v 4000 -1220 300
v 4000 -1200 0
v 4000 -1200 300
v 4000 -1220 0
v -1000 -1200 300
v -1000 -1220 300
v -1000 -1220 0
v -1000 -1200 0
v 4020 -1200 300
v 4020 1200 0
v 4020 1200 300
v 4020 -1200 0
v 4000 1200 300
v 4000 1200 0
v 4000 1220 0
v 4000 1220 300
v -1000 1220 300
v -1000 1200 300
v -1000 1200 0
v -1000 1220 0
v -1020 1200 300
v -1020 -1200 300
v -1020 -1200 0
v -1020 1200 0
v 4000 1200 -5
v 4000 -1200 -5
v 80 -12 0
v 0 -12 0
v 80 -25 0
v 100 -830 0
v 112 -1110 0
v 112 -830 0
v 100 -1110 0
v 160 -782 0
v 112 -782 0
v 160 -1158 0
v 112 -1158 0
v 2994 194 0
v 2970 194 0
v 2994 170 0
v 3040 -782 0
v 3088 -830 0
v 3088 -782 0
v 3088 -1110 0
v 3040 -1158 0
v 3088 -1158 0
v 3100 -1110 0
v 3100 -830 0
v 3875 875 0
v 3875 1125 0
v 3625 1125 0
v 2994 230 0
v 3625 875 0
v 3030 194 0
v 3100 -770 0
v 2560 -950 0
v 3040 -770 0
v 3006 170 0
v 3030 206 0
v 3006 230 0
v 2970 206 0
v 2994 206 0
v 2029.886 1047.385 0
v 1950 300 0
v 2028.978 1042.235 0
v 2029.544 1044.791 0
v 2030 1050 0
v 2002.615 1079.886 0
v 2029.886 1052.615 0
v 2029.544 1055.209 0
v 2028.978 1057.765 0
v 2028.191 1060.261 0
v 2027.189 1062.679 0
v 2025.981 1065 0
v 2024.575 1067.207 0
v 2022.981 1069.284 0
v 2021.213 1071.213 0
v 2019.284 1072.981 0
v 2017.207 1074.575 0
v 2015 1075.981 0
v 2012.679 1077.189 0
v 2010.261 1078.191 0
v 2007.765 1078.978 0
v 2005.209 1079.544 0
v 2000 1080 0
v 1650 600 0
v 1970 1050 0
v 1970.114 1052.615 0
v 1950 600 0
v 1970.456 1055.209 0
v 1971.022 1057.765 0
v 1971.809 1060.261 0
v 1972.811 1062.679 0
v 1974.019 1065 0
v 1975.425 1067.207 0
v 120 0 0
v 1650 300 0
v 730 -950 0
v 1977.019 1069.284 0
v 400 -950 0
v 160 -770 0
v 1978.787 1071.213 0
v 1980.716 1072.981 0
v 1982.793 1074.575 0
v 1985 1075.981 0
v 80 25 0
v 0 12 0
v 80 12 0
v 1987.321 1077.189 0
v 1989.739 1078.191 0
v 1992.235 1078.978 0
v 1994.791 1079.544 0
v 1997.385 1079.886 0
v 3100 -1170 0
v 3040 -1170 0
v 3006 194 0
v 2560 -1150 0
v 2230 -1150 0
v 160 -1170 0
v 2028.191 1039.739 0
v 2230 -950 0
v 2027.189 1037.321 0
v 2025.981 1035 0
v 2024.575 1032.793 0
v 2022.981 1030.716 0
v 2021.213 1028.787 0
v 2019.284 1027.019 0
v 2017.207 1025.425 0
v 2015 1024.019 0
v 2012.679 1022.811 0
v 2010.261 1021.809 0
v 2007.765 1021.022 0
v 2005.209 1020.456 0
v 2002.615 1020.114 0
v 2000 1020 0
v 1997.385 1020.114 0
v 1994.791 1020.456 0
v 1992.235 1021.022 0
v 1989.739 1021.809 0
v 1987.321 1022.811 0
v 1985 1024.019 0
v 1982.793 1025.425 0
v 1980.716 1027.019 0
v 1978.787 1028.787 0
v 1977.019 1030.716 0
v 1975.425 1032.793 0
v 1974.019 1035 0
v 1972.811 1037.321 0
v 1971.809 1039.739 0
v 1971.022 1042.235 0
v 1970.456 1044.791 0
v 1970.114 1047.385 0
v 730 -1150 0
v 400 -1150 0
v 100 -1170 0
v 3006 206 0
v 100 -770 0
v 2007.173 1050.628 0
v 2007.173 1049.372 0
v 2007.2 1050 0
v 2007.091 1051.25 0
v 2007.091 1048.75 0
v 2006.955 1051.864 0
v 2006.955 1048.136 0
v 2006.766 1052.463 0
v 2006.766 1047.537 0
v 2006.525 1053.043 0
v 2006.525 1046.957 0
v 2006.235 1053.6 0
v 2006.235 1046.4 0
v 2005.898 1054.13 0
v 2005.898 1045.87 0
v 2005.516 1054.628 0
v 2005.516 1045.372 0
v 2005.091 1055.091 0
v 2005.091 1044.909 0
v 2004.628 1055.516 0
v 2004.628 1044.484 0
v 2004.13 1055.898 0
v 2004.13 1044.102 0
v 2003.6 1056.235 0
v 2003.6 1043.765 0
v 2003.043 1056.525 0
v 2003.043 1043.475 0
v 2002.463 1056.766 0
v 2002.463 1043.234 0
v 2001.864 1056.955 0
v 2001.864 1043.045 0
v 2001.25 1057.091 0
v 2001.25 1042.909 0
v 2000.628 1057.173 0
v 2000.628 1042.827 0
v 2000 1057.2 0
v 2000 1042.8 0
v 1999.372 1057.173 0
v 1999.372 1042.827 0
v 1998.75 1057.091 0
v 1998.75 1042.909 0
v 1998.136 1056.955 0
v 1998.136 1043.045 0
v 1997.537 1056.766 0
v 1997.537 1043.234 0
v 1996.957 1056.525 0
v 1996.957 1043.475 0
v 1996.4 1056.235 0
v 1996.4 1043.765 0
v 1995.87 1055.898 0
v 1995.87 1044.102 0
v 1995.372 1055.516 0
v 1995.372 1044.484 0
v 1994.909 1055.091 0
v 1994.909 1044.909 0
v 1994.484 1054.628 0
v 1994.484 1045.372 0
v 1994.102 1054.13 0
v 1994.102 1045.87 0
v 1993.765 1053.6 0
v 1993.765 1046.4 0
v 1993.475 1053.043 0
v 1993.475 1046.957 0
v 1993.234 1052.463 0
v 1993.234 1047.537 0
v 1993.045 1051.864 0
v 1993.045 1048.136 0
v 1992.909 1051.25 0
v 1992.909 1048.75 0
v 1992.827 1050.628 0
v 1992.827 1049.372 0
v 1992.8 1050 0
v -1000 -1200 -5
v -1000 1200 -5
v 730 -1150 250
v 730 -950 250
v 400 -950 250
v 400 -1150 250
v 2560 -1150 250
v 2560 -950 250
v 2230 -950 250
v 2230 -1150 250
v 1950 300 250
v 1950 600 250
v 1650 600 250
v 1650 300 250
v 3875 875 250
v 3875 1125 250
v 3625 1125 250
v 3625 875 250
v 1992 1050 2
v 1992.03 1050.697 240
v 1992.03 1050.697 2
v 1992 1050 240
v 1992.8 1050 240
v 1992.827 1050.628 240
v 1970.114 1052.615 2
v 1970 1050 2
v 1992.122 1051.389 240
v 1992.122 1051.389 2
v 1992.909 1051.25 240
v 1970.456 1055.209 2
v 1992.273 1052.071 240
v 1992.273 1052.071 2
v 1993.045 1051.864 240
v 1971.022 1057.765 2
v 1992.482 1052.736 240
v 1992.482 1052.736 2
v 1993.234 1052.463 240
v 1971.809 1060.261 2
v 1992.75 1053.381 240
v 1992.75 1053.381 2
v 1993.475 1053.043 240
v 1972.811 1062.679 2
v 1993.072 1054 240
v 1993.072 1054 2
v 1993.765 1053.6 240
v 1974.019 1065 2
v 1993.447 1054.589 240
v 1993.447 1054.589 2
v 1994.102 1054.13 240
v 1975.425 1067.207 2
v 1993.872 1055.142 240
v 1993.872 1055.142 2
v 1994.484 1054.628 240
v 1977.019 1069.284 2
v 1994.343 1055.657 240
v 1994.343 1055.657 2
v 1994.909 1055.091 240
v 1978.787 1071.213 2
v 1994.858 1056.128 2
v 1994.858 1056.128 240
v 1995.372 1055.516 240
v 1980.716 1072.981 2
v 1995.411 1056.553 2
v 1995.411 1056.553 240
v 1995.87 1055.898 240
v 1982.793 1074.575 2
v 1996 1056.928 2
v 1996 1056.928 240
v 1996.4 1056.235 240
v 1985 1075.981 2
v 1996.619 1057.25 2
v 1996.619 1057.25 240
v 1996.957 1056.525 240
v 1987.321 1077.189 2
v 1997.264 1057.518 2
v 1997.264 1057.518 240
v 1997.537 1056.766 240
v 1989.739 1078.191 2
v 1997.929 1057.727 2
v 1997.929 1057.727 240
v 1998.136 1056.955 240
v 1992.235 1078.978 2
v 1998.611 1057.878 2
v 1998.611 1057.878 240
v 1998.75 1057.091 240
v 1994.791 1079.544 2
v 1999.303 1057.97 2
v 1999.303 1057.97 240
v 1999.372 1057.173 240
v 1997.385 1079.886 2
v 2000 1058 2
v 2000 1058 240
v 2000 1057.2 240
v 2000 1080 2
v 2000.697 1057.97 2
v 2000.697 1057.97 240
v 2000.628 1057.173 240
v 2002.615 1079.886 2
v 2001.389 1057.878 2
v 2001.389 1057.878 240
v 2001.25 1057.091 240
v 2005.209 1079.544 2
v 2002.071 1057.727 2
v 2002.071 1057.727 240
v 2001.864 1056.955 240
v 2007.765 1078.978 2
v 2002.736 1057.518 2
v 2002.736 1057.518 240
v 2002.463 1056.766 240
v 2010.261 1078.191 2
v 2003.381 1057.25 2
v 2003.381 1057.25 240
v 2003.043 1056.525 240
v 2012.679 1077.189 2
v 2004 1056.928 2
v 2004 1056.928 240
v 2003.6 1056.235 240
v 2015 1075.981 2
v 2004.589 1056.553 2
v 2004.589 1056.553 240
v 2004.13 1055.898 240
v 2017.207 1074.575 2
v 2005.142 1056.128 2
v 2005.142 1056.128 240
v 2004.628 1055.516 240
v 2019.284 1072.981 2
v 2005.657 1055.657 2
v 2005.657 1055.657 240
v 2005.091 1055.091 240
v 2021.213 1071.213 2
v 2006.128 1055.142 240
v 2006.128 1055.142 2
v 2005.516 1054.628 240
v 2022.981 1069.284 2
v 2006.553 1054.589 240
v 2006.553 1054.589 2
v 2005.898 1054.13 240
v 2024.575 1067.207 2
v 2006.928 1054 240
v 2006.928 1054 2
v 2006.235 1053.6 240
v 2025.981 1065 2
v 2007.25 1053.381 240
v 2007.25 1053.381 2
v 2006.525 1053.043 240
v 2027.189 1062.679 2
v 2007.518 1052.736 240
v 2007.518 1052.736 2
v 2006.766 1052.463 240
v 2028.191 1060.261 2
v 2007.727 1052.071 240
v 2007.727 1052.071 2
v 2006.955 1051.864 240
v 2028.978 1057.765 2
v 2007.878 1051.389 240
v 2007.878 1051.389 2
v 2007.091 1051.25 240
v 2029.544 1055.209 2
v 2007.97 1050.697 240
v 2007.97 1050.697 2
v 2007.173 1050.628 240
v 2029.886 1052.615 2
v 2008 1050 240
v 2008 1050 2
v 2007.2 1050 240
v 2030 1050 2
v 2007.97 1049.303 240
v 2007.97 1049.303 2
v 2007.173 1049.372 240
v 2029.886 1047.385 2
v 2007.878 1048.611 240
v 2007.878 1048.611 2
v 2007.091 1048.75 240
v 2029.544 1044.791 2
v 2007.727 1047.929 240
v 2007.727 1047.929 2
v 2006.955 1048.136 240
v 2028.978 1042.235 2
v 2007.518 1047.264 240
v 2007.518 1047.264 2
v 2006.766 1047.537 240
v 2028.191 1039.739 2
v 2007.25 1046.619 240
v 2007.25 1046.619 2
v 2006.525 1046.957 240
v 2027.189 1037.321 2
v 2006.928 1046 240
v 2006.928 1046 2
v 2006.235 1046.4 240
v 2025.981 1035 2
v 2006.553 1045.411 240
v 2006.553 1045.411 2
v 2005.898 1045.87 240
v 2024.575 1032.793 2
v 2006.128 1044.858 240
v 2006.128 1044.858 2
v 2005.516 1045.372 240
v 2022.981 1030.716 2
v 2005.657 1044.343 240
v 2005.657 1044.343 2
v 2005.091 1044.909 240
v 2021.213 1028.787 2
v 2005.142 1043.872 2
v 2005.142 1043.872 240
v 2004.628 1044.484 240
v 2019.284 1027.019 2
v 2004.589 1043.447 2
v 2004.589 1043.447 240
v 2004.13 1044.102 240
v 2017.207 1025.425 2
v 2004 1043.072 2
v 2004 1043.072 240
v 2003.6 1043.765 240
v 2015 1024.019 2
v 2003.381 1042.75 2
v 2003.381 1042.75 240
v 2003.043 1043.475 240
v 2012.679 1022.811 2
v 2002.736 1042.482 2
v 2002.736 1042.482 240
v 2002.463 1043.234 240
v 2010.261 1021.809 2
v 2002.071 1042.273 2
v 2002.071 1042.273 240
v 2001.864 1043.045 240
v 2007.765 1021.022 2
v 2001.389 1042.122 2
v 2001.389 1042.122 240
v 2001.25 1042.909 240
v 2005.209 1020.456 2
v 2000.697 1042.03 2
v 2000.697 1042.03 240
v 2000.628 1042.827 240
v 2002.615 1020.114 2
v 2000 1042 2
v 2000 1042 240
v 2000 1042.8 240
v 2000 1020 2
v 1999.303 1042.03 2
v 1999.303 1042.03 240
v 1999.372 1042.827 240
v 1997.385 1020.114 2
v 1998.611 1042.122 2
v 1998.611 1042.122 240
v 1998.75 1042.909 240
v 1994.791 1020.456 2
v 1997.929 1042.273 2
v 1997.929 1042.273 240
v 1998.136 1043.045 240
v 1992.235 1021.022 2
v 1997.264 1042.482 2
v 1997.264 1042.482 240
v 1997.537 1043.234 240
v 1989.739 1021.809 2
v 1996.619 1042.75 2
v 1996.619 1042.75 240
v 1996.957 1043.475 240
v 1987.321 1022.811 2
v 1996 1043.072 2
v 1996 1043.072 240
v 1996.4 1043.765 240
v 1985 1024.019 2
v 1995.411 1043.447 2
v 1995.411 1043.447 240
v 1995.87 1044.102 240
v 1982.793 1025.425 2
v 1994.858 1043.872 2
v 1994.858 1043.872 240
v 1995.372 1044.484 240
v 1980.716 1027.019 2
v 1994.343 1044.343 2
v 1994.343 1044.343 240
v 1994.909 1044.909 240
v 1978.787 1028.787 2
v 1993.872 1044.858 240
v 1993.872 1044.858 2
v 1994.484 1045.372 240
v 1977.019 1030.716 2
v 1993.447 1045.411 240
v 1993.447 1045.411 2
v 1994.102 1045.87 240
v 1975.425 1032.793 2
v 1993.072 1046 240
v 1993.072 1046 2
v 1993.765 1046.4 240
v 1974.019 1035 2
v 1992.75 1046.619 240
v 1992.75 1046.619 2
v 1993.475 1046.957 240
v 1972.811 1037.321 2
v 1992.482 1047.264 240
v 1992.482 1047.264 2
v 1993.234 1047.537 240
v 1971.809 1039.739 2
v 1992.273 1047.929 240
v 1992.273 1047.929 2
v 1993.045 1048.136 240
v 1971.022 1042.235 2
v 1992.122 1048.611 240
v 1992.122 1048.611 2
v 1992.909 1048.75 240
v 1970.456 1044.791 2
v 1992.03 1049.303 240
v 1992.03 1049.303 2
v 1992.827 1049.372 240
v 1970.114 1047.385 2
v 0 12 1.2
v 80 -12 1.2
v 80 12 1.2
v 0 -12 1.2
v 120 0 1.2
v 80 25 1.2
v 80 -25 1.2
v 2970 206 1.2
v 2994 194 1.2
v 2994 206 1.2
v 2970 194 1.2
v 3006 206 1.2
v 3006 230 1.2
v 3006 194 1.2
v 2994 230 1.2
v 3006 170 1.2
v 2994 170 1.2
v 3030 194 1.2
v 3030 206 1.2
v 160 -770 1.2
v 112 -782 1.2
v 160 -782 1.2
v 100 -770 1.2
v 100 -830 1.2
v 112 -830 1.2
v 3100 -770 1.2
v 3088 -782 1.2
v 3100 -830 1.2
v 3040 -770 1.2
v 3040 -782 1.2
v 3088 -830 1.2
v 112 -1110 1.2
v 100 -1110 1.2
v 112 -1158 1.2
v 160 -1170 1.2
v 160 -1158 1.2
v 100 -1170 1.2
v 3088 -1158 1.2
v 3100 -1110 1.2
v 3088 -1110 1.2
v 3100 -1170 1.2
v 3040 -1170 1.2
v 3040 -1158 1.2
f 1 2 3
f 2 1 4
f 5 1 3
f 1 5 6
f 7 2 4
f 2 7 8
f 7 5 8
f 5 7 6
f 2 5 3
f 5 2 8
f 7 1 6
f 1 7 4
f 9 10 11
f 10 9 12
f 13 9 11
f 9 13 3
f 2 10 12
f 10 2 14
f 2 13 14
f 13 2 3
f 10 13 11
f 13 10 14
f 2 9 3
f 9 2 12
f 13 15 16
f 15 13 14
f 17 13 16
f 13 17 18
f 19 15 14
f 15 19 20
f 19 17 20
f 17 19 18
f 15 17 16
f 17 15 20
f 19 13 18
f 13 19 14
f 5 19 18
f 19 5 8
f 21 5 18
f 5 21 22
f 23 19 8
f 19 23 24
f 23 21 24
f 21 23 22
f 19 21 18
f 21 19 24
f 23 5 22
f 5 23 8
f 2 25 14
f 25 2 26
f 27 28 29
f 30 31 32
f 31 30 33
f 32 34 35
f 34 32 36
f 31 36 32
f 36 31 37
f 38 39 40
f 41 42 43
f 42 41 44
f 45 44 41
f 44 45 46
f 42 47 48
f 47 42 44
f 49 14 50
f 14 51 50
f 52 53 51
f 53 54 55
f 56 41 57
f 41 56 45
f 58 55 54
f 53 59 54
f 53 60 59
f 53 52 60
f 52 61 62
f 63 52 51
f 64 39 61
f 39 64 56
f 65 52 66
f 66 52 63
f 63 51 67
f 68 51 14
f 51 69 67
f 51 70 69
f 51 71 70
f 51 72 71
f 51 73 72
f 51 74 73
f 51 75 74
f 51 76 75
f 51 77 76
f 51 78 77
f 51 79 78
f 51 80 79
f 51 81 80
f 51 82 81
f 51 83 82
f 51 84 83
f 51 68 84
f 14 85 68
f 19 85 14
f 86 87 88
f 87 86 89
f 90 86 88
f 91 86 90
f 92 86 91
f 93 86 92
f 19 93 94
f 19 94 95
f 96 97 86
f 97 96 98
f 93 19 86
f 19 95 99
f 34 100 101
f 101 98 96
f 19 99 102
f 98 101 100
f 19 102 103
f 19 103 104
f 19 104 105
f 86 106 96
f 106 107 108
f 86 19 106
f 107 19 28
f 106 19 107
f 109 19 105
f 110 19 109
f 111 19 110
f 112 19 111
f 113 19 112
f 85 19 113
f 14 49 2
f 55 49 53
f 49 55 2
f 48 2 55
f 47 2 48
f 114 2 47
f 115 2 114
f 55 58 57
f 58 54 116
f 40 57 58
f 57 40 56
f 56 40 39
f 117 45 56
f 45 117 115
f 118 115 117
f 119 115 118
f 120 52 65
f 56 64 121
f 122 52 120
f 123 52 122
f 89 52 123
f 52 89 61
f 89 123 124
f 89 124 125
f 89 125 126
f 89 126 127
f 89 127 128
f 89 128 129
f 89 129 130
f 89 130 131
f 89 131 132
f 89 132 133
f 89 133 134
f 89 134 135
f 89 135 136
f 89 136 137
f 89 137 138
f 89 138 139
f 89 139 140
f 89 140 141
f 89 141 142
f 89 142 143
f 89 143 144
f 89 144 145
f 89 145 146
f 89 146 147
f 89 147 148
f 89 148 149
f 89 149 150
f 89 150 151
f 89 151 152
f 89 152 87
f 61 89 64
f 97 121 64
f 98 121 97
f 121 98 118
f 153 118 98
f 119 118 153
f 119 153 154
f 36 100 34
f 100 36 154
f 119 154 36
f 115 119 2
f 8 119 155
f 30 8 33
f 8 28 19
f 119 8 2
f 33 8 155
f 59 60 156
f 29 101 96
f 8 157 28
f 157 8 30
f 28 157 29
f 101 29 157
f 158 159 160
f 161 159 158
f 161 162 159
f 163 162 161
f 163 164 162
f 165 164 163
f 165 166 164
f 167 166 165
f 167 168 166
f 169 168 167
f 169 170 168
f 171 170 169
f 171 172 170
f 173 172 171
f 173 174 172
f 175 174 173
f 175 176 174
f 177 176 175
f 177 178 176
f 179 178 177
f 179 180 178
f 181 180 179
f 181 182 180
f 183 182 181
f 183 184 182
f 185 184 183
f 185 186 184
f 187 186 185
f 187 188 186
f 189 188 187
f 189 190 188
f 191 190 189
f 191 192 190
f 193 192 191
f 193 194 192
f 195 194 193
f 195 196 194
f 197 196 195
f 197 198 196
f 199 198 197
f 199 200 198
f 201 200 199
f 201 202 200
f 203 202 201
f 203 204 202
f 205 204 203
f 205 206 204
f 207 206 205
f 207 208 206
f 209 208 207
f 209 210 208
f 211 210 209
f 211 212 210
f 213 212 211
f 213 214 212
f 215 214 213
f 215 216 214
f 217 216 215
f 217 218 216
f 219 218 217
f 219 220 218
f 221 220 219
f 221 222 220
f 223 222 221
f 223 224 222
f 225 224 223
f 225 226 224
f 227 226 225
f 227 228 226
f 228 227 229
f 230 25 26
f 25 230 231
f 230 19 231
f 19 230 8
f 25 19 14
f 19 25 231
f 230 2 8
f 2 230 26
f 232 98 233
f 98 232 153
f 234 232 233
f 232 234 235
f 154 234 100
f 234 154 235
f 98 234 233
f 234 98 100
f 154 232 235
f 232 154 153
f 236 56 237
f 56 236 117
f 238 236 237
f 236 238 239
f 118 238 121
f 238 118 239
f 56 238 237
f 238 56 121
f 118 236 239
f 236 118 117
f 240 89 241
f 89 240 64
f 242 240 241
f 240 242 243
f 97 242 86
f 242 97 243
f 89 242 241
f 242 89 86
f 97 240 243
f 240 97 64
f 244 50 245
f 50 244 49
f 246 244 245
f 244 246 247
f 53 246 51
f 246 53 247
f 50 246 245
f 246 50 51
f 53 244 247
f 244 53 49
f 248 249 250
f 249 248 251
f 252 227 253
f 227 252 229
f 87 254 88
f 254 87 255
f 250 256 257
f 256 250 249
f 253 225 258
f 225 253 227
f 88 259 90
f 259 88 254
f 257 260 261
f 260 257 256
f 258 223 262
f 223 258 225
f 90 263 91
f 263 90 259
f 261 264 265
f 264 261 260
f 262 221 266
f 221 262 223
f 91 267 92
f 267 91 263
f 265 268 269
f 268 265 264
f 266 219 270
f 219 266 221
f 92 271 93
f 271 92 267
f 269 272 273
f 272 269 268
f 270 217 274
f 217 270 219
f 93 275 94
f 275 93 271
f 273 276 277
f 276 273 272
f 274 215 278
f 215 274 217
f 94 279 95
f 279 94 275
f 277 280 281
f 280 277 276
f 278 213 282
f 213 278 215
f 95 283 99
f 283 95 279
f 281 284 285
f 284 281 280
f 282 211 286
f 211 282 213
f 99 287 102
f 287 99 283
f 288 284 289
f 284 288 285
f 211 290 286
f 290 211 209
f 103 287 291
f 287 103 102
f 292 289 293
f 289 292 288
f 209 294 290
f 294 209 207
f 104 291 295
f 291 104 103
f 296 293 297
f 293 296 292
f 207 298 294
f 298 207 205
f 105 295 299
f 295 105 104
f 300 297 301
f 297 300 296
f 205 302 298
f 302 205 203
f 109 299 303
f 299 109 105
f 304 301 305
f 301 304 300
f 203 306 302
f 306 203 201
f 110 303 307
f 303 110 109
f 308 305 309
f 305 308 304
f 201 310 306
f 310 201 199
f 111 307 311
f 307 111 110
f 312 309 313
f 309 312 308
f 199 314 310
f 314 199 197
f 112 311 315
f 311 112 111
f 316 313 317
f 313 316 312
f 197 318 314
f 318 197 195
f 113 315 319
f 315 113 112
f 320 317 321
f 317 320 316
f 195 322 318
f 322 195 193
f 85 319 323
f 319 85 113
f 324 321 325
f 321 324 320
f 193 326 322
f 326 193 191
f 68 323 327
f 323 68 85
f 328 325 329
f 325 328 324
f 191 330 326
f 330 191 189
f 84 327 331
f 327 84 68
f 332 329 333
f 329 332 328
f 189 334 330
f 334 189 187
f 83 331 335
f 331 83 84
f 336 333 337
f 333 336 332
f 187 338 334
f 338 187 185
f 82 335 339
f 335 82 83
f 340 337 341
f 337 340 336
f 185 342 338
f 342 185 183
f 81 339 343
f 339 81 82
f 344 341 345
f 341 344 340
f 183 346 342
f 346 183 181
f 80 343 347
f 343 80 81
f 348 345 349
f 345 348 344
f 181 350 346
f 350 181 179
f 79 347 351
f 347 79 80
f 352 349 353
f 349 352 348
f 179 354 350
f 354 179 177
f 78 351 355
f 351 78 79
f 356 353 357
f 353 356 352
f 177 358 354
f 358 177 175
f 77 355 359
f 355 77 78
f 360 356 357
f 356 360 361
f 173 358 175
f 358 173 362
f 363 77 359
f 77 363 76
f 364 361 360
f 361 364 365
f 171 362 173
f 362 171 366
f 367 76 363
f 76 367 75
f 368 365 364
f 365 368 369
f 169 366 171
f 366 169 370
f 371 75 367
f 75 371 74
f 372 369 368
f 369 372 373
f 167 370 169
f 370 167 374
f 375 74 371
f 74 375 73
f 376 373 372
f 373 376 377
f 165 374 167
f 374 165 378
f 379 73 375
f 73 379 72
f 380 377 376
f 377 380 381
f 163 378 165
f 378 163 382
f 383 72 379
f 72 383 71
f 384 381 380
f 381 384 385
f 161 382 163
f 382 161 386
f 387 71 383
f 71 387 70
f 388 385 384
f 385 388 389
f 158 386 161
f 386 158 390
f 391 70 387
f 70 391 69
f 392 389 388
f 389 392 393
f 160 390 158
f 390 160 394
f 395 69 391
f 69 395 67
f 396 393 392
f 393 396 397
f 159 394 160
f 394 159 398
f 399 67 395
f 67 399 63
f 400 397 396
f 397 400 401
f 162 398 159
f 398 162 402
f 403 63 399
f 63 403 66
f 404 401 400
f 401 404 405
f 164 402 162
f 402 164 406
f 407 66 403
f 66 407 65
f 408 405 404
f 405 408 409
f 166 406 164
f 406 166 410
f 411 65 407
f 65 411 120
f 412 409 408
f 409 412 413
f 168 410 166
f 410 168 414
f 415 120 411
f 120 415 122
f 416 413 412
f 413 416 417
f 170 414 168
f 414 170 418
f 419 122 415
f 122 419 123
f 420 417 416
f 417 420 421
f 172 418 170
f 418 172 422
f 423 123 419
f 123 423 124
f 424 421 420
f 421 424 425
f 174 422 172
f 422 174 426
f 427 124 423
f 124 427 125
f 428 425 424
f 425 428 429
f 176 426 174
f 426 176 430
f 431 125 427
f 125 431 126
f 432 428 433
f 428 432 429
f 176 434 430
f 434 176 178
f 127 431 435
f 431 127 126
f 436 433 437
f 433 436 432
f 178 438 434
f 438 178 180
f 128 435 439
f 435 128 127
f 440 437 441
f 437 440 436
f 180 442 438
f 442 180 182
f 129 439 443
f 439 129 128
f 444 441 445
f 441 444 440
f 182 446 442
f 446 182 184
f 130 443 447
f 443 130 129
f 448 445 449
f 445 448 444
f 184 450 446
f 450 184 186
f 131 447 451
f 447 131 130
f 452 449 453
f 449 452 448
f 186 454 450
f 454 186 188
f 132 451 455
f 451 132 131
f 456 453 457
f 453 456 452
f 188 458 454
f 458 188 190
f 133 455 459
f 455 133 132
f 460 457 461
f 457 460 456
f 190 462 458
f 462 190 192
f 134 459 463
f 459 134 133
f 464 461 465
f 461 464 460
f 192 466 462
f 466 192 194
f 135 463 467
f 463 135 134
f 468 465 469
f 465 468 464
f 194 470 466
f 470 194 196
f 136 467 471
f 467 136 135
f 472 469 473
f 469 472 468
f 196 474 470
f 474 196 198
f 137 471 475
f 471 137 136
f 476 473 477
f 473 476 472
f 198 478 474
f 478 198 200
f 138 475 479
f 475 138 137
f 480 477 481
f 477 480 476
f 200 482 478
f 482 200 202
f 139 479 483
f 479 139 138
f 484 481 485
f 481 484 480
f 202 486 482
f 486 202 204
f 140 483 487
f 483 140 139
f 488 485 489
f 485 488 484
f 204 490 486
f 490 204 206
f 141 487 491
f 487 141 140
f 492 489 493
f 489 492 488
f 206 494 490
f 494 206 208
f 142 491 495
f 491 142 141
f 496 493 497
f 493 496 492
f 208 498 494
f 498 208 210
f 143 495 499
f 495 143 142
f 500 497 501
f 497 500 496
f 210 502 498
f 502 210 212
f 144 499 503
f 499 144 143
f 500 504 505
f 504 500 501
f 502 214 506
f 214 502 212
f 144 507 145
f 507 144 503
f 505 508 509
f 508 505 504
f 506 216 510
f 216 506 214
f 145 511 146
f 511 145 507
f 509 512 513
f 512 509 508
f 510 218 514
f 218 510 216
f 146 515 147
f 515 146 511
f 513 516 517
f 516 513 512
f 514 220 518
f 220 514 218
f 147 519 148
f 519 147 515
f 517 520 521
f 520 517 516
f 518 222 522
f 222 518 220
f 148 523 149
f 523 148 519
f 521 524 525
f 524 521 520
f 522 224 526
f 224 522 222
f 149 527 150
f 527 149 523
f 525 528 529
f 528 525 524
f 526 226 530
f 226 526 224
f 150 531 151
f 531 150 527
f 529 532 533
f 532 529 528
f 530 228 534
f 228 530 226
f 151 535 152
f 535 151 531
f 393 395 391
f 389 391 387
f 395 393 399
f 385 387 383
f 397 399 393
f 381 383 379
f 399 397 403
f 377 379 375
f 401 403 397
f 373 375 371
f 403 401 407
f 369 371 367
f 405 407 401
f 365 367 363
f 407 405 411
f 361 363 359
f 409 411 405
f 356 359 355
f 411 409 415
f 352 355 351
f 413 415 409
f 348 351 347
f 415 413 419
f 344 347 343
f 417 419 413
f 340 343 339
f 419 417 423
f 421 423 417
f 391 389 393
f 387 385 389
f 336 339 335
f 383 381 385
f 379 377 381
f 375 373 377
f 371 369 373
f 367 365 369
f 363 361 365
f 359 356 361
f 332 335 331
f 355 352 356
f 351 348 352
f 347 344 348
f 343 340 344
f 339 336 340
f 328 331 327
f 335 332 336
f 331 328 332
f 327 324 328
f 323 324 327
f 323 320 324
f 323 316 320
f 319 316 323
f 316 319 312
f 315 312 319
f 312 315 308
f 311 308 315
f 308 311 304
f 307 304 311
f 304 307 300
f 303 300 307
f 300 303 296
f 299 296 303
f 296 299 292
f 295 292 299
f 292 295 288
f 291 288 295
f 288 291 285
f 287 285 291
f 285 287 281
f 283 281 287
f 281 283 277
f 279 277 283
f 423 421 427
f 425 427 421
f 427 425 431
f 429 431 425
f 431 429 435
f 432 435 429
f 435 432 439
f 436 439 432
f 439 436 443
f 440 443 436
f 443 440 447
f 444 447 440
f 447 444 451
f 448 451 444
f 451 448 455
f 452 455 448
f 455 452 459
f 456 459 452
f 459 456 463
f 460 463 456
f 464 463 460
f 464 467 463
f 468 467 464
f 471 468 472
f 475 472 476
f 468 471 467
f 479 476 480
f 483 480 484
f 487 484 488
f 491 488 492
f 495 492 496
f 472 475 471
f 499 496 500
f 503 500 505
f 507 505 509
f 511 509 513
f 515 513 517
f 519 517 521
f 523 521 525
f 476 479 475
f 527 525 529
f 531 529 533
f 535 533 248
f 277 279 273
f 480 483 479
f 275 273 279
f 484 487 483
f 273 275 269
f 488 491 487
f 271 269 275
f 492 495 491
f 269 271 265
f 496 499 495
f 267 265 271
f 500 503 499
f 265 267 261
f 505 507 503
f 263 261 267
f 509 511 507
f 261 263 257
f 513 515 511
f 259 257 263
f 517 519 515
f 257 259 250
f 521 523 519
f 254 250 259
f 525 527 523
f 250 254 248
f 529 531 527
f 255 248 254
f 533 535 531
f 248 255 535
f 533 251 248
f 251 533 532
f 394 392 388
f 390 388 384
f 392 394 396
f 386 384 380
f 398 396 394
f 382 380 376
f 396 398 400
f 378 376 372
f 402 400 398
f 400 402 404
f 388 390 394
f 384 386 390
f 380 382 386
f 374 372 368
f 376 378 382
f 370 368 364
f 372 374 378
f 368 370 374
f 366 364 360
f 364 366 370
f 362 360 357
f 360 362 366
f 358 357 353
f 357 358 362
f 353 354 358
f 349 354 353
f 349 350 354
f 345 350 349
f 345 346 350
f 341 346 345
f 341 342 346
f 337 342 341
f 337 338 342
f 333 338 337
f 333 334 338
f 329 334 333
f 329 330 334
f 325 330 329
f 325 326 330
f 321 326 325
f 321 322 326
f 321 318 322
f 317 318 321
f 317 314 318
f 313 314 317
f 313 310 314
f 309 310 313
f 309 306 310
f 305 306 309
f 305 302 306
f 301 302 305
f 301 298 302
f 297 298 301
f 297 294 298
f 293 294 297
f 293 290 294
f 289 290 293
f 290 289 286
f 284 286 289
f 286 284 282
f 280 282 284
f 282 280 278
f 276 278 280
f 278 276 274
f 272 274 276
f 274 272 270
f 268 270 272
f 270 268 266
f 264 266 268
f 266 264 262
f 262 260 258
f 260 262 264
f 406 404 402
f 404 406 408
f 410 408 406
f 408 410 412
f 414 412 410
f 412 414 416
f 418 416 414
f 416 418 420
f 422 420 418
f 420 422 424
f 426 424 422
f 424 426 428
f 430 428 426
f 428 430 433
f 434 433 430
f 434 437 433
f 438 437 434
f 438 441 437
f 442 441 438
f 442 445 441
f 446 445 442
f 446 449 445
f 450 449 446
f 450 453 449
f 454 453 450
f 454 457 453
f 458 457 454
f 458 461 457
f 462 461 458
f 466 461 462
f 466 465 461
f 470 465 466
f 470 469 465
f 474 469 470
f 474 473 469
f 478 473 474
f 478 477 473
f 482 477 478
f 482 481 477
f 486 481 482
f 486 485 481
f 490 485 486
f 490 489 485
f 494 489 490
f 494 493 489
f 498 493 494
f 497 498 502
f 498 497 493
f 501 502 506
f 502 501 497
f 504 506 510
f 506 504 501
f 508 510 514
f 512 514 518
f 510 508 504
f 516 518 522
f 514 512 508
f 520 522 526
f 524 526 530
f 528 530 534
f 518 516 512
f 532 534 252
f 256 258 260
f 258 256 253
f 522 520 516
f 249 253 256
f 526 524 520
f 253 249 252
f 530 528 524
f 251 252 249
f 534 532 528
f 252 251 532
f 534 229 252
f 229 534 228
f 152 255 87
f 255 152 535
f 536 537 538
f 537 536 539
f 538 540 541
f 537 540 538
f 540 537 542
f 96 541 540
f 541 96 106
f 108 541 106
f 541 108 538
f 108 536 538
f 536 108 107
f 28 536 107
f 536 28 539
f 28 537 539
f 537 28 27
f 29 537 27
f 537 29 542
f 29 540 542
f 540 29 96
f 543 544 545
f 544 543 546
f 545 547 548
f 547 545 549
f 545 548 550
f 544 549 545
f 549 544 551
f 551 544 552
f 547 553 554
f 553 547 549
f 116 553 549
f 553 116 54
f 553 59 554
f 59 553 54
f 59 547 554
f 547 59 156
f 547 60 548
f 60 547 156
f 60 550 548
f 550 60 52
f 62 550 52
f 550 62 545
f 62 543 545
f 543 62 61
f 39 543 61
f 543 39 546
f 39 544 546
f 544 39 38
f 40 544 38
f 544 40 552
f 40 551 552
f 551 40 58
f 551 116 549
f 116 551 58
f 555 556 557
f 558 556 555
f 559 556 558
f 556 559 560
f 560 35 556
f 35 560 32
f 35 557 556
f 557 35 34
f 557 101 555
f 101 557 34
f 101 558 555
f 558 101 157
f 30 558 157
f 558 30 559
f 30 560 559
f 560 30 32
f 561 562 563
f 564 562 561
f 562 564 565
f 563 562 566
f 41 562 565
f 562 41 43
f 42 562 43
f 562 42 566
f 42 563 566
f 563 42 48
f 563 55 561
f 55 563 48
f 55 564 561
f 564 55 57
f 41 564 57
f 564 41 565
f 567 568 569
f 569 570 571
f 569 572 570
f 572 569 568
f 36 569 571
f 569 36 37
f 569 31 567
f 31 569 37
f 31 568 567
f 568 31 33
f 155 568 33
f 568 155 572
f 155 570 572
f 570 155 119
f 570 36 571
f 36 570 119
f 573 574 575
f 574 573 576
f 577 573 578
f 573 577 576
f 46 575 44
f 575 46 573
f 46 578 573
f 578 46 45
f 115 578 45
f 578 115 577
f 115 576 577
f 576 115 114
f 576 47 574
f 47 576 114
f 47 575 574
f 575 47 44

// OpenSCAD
// Demo course assembly (generated by tools/demo_course_drawings.py) - mm, datum = start mark (car rear-axle centre),
// +x towards the end (brake) wall, +y away from the kerb wall, z up. Open in OpenSCAD; export STL / 3MF / DXF (projection).
wall_h = 300; wall_t = 20;
module post() { rotate_extrude($fn=72) polygon([[7.2, 0.0], [30.0, 0.0], [30.0, 2.0], [8.0, 2.0], [8.0, 240.0], [7.2, 240.0]]); }
module marker_start() { linear_extrude(1.2) polygon([[0, -12], [80, -12], [80, -25], [120, 0], [80, 25], [80, 12], [0, 12]]); }
module marker_goal() { linear_extrude(1.2) polygon([[-6, -30], [6, -30], [6, -6], [30, -6], [30, 6], [6, 6], [6, 30], [-6, 30], [-6, 6], [-30, 6], [-30, -6], [-6, -6]]); }
module marker_corner() { linear_extrude(1.2) polygon([[0, 0], [60, 0], [60, 12], [12, 12], [12, 60], [0, 60]]); }
module box(c, s) { translate([c[0] - s[0] / 2, c[1] - s[1] / 2, 0]) cube(s); }
color("Silver", 0.5) { translate([-1000.0, -1200.0 - wall_t, 0]) cube([5000.0, wall_t, wall_h]);   // W1 kerb wall
  translate([4000.0, -1200.0, 0]) cube([wall_t, 2400.0, wall_h]);                       // W2 end wall
  translate([-1000.0, 1200.0, 0]) cube([5000.0, wall_t, wall_h]);                       // W3 side wall
  translate([-1000.0 - wall_t, -1200.0, 0]) cube([wall_t, 2400.0, wall_h]); }            // W4 back wall
color("WhiteSmoke") translate([-1000.0, -1200.0, -5]) cube([5000.0, 2400.0, 5]);   // floor
color("BurlyWood") box([565.0, -1050.0], [330, 200, 250]);   // C1 parked car 1 (cardboard box)
color("BurlyWood") box([2395.0, -1050.0], [330, 200, 250]);   // C2 parked car 2 (cardboard box)
color("BurlyWood") box([1800.0, 450.0], [300, 300, 250]);   // O obstacle (cardboard box)
color("Black") box([3750.0, 1000.0], [250, 250, 250]);   // D dark box (optional)
color("RoyalBlue") translate([2000.0, 1050.0, 0]) post();   // T
color("SeaGreen") translate([0.0, 0.0, 0]) rotate([0, 0, 0]) marker_start();   // S
color("SeaGreen") translate([3000.0, 200.0, 0]) rotate([0, 0, 0]) marker_goal();   // G
color("SeaGreen") translate([100.0, -770.0, 0]) rotate([0, 0, -90]) marker_corner();   // L1
color("SeaGreen") translate([3100.0, -770.0, 0]) rotate([0, 0, 180]) marker_corner();   // L2
color("SeaGreen") translate([100.0, -1170.0, 0]) rotate([0, 0, 0]) marker_corner();   // L3
color("SeaGreen") translate([3100.0, -1170.0, 0]) rotate([0, 0, 90]) marker_corner();   // L4
%translate([-50.0, -100.0, 30]) cube([330.0, 200.0, 120]);   // the RC car on the start mark (reference only)
%translate([120.0, 0, 175.0]) cylinder(r=38, h=50, $fn=48);   // its LiDAR (scan plane z = 200)
